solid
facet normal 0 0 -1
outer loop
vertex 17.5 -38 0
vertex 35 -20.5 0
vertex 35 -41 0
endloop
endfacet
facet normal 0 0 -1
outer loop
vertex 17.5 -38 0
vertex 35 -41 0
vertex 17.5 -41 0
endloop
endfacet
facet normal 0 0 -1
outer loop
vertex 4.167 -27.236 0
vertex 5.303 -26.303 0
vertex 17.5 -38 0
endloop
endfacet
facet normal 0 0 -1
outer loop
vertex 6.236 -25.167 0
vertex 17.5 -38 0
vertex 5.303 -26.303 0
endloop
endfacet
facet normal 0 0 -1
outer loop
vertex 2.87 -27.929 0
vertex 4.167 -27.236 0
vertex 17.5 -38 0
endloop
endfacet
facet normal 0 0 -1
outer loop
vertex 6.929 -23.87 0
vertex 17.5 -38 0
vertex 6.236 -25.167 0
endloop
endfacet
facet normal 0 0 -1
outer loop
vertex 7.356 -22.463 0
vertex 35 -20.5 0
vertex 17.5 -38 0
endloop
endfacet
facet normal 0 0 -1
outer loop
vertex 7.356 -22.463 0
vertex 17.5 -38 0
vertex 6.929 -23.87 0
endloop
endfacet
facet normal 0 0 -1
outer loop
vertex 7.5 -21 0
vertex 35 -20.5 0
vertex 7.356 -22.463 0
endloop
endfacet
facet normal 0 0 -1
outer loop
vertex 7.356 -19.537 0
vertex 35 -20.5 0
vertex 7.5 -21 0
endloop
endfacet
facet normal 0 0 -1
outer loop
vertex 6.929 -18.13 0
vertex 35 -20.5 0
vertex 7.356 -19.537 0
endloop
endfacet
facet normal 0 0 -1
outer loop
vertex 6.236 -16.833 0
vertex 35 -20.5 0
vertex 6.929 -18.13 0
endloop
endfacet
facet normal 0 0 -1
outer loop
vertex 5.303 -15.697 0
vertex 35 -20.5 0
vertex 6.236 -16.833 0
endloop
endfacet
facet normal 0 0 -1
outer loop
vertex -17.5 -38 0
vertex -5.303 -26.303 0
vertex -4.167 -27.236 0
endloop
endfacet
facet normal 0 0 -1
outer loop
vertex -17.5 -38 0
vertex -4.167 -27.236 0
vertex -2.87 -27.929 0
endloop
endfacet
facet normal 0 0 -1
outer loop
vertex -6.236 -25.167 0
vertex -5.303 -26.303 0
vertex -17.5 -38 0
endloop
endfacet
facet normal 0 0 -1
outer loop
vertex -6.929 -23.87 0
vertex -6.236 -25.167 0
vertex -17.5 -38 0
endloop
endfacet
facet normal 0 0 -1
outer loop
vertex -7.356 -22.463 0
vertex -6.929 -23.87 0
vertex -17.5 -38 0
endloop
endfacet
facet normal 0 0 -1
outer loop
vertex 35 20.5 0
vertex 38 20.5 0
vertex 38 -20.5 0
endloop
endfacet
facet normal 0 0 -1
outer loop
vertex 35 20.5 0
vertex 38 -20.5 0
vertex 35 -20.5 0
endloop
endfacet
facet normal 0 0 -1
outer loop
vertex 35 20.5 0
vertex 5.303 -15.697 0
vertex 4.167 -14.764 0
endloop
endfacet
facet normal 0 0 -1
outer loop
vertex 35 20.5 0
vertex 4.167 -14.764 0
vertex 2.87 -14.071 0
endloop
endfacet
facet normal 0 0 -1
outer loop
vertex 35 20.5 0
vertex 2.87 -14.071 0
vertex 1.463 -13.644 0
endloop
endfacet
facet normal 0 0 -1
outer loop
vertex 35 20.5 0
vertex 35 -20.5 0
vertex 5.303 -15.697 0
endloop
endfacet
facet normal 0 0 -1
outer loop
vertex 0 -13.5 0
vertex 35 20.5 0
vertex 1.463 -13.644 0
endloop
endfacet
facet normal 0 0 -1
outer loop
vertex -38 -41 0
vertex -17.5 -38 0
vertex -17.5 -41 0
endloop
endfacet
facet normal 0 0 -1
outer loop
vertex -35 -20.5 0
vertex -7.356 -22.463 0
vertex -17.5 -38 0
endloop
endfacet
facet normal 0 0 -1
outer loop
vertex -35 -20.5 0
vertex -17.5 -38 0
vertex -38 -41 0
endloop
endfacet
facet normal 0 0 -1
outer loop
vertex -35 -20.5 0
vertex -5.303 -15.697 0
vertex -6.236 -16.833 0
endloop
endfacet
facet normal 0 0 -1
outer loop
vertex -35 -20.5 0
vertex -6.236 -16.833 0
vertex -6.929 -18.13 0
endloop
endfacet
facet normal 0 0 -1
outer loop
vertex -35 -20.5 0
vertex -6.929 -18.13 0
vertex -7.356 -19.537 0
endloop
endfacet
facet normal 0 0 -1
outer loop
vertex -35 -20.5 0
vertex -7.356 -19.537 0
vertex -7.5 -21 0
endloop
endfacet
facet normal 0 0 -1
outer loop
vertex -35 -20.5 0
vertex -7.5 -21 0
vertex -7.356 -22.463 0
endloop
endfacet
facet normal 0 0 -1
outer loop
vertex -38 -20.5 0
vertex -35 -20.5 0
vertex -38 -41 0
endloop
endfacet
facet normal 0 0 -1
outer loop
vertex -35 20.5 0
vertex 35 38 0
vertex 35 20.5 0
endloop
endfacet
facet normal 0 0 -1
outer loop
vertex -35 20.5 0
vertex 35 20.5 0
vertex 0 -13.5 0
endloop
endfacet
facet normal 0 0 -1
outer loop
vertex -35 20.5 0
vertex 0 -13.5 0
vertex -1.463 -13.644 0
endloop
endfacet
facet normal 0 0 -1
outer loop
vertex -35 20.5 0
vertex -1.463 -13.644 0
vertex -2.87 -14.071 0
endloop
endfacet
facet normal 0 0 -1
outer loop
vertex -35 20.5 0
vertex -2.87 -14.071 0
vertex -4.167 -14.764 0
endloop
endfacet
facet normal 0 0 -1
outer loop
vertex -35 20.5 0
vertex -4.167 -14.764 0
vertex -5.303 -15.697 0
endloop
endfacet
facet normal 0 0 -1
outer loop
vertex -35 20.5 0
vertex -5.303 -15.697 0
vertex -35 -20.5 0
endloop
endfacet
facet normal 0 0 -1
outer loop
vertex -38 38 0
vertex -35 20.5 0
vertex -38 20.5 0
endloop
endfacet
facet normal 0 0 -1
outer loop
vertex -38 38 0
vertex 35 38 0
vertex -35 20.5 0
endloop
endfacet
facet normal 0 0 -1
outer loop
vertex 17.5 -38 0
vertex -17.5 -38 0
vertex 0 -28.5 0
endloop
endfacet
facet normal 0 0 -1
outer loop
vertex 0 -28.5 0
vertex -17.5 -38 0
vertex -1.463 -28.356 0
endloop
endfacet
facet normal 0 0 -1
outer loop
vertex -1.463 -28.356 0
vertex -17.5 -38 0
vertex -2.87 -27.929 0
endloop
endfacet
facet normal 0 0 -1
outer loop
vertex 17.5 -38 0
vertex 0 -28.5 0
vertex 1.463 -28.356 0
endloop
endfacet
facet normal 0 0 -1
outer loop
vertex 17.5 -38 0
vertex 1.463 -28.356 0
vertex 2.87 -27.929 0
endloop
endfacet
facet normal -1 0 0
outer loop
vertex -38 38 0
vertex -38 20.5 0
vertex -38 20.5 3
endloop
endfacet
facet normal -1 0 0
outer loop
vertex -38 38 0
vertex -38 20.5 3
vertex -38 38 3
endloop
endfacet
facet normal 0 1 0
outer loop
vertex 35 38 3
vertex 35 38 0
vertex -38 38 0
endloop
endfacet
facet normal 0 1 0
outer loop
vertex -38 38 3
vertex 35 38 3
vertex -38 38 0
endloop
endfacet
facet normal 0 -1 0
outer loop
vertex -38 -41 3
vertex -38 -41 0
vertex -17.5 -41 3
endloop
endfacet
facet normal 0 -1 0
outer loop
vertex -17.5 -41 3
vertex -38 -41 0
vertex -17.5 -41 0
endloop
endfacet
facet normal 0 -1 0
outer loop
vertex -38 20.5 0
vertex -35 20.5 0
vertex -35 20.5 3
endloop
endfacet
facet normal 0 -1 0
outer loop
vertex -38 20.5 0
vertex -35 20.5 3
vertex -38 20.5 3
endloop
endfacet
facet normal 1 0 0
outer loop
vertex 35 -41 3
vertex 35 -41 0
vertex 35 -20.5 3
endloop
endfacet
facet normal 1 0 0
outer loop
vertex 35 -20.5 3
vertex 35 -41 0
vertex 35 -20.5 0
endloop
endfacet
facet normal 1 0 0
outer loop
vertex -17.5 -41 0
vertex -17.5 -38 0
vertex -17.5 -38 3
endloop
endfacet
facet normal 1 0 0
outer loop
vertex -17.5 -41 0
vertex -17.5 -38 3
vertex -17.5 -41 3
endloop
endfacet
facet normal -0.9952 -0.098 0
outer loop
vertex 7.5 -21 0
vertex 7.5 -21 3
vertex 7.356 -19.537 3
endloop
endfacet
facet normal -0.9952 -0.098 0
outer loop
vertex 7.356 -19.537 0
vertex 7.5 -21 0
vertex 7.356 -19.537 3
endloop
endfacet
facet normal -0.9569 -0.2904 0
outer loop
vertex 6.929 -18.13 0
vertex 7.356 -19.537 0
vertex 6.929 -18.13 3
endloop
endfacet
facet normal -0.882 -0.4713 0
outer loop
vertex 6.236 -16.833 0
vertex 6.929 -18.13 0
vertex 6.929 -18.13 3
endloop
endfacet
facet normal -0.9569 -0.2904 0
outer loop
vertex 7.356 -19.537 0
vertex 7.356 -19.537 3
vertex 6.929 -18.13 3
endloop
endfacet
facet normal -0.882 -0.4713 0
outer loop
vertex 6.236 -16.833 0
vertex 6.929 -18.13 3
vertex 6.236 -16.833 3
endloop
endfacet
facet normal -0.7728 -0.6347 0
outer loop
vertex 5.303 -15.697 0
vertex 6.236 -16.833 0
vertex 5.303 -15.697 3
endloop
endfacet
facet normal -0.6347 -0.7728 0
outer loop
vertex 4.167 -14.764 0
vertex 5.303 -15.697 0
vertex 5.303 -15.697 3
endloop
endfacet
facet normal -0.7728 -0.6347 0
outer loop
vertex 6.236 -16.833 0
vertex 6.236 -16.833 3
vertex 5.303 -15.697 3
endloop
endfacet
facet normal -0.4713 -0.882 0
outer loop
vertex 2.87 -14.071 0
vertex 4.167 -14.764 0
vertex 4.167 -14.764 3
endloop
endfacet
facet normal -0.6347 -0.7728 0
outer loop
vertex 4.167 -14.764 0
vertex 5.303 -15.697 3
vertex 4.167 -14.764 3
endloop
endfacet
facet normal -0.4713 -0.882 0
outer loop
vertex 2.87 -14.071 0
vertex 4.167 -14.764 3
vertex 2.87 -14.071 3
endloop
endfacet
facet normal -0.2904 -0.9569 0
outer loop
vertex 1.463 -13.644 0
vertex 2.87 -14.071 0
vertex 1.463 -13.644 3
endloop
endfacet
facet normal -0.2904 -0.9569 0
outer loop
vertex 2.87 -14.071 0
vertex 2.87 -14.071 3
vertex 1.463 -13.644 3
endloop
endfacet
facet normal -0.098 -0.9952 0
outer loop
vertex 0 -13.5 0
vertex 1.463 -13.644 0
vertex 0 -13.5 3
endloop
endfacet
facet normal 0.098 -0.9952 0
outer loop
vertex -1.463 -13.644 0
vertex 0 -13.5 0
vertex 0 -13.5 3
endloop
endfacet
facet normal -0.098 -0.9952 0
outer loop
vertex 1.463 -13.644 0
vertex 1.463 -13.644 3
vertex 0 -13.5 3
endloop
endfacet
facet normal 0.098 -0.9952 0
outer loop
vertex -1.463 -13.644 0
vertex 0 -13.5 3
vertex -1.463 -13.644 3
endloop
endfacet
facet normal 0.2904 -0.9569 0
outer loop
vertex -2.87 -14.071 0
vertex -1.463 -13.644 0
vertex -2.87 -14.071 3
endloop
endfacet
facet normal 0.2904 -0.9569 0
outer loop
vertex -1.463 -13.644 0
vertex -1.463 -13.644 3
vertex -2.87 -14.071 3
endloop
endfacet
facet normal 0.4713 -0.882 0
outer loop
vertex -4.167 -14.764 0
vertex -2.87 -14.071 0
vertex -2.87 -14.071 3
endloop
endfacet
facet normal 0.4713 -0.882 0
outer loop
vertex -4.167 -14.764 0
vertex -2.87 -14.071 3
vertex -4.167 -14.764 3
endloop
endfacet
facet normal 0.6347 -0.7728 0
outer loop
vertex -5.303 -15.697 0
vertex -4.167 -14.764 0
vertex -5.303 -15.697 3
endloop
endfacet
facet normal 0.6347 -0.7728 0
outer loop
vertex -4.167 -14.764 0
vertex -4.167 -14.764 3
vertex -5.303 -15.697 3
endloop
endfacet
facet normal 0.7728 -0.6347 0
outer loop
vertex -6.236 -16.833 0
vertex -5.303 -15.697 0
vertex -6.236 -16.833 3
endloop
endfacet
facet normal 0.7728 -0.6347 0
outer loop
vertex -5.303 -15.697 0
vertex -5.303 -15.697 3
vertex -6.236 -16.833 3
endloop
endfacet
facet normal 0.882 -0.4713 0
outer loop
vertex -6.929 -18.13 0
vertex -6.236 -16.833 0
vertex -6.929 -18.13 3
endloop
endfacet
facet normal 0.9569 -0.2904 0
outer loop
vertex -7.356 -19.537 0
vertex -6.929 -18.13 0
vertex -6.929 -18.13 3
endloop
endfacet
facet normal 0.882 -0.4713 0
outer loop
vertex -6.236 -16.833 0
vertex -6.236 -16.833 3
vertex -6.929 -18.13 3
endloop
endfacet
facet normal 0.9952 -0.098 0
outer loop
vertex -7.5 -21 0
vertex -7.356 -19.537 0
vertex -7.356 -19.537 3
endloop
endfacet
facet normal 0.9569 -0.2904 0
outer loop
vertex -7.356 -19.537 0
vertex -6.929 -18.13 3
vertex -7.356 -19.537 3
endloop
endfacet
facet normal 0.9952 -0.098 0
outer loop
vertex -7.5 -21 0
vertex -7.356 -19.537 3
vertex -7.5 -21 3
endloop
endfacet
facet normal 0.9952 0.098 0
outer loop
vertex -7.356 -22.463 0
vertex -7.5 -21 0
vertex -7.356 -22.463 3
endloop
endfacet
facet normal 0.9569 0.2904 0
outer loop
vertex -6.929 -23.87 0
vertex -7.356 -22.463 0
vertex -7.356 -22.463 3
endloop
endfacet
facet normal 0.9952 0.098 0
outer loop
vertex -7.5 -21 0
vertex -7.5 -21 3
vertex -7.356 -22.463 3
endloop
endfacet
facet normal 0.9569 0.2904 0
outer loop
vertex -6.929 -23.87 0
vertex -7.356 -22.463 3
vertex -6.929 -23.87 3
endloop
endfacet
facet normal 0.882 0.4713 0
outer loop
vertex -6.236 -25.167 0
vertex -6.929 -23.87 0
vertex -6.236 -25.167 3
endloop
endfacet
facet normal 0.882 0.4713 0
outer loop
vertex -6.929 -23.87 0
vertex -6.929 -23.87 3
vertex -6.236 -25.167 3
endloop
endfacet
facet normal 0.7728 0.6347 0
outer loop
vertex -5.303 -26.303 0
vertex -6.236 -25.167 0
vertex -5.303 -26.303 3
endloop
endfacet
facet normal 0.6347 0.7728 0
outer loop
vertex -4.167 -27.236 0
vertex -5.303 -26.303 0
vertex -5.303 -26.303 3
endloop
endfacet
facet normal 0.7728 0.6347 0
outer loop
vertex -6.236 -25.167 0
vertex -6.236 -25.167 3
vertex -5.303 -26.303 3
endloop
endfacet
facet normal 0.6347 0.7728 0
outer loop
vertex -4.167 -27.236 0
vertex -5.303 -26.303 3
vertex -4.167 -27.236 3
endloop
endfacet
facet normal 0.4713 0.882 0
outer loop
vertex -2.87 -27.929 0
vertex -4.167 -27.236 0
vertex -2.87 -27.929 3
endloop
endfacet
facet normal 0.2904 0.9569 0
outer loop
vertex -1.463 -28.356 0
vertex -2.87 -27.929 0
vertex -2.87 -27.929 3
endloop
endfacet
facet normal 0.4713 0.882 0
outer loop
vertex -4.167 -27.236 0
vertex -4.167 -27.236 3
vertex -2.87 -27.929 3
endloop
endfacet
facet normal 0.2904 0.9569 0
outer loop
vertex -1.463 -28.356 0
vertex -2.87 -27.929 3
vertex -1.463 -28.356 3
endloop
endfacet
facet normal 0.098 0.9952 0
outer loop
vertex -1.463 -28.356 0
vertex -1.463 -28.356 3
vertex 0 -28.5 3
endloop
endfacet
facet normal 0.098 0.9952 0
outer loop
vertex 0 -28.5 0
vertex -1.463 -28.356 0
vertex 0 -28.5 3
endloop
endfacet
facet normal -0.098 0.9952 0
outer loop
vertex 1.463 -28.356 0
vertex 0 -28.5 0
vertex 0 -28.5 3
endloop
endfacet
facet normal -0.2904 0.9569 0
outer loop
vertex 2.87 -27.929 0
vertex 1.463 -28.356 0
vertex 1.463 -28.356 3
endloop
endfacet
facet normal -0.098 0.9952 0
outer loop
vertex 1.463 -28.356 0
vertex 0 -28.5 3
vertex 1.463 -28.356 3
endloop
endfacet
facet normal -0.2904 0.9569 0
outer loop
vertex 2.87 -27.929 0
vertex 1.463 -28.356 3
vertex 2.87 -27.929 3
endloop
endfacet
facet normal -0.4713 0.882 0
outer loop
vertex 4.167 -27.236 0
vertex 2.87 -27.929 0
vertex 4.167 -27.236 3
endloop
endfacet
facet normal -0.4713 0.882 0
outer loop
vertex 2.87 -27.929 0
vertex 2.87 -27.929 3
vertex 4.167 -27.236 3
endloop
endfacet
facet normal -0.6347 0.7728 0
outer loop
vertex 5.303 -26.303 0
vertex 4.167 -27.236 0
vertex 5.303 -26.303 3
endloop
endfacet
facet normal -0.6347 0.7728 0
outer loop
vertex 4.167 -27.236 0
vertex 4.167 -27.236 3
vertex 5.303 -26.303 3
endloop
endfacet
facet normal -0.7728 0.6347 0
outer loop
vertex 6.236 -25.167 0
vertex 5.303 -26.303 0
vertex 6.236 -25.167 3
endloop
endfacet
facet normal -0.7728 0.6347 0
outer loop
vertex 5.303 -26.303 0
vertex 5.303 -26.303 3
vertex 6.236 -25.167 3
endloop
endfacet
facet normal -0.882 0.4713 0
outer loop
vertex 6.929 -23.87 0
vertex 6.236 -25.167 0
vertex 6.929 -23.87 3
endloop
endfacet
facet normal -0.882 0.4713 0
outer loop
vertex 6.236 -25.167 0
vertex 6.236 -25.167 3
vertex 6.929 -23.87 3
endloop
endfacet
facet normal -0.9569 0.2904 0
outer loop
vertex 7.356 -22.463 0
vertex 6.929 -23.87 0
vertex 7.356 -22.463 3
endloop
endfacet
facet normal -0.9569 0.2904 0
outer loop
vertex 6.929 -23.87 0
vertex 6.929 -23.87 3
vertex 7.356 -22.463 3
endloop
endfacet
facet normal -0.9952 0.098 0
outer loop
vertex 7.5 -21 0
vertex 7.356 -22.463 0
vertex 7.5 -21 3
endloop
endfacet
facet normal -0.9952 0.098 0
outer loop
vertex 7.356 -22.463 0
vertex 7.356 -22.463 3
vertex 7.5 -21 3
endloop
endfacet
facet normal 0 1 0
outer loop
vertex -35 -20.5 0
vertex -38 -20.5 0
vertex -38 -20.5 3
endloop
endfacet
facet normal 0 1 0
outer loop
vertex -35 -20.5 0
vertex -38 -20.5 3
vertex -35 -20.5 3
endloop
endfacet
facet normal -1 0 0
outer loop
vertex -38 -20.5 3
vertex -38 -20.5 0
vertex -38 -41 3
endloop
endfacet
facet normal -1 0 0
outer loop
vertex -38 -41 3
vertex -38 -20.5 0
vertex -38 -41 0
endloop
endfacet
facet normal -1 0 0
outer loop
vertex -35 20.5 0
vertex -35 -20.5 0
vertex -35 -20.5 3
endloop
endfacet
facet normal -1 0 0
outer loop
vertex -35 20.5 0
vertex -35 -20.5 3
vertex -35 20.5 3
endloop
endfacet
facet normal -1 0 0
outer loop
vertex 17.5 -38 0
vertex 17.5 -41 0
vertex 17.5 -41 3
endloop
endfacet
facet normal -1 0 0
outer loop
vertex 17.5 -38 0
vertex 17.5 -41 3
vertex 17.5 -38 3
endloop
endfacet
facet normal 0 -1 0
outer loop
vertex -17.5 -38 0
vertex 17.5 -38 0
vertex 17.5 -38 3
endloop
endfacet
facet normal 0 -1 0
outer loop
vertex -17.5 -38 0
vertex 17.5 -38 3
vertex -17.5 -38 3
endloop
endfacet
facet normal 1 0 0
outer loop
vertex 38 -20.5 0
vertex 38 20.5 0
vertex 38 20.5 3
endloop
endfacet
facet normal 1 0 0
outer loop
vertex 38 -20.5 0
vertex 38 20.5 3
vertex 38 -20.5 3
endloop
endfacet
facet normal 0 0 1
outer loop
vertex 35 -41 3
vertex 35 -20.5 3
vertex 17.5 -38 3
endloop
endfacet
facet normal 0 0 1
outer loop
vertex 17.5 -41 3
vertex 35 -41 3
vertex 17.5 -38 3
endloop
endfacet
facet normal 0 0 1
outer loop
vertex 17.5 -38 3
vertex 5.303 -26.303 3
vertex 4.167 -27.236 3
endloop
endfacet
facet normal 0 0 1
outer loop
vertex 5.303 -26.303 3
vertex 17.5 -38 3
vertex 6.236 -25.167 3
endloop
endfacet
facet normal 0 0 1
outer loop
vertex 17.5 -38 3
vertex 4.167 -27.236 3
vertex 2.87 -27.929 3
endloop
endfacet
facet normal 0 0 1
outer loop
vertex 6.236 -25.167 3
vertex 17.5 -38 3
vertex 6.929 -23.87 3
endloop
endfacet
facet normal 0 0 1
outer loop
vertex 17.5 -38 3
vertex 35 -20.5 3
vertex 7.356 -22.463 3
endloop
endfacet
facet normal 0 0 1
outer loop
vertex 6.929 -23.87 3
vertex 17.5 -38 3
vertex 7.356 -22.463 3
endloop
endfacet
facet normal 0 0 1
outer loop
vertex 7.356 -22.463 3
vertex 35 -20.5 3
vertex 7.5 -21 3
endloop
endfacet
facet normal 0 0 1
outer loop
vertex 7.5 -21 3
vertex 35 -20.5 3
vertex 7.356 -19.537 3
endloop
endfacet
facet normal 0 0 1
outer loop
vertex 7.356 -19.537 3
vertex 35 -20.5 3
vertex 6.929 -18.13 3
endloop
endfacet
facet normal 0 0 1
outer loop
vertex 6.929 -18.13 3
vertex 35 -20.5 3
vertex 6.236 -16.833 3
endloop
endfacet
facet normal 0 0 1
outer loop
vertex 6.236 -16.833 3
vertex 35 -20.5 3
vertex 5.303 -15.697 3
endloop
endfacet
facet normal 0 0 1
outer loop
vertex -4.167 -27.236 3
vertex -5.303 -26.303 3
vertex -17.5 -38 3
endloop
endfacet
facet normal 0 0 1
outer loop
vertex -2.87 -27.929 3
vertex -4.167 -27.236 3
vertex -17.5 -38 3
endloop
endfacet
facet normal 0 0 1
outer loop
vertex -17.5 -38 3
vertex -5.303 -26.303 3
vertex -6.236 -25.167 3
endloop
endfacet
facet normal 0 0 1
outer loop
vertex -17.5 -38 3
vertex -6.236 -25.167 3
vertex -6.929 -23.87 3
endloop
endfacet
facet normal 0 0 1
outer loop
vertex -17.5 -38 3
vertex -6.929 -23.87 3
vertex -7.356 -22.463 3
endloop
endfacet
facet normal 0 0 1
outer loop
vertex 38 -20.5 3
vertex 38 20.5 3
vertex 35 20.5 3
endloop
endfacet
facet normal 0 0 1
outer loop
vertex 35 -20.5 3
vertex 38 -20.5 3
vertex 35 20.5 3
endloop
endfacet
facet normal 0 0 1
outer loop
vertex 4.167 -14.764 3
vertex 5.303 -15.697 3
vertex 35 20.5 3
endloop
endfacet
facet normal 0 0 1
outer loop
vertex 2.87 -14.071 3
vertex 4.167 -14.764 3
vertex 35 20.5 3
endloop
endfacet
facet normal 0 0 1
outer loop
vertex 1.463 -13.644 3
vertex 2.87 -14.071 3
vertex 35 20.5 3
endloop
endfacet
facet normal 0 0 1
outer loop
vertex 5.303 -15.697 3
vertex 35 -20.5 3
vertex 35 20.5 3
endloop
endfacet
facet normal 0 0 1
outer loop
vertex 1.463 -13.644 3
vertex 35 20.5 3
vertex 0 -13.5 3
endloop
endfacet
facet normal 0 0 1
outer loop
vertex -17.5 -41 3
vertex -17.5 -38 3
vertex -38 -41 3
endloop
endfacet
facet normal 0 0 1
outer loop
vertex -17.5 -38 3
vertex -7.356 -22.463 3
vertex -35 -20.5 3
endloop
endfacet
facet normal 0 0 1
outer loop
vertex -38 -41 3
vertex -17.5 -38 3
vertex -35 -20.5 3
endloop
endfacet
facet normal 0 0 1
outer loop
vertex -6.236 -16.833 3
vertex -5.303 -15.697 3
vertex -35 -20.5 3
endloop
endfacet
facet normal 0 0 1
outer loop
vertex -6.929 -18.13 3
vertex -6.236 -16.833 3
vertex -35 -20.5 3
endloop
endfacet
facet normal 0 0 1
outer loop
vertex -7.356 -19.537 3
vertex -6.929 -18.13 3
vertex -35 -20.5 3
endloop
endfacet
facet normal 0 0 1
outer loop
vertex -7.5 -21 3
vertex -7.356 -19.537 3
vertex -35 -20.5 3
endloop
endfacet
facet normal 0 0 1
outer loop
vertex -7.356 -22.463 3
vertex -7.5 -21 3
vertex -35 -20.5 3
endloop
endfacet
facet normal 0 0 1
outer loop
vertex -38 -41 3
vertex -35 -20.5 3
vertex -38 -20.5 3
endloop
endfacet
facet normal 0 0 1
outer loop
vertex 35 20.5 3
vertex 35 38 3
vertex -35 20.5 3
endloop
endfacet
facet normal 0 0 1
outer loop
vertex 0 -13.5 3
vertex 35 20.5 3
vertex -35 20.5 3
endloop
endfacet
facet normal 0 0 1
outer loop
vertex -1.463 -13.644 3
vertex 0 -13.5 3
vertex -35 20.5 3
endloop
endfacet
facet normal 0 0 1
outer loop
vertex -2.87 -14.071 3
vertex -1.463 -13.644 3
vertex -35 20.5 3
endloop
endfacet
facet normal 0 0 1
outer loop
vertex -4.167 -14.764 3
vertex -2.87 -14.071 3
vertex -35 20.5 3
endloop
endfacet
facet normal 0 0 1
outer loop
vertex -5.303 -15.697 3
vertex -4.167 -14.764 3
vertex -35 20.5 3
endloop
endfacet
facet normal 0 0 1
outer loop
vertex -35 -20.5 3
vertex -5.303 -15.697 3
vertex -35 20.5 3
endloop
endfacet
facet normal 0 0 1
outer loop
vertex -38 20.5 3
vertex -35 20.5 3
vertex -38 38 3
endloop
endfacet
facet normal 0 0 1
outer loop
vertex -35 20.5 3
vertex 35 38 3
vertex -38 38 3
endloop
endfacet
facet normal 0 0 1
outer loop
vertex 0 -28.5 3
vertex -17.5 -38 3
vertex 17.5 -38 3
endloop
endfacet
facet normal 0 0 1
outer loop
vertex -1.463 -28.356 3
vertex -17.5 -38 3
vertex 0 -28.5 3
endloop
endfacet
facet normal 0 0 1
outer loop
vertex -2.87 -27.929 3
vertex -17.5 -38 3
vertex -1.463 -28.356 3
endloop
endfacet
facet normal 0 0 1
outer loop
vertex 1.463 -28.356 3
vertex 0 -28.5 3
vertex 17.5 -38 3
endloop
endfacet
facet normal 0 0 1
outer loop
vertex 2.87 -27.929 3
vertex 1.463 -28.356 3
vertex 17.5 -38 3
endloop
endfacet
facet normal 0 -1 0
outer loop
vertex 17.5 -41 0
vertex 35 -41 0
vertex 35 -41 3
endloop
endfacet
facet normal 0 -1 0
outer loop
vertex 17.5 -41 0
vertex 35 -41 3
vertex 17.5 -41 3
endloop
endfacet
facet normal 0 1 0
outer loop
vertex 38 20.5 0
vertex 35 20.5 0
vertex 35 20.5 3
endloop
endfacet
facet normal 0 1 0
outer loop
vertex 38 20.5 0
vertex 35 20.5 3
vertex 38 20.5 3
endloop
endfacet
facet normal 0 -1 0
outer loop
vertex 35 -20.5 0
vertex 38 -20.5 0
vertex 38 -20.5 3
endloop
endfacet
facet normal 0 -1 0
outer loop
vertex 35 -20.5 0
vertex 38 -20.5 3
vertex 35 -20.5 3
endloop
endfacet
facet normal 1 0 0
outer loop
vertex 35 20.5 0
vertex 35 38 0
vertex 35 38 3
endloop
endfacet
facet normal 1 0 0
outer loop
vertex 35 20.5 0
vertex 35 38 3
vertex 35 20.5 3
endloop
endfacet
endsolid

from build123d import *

# Parameters (mm, degrees)
BOSS_EXTRUDE1_DEPTH = 3
SKETCH2_R           = 7.5
CUT_EXTRUDE1_DEPTH  = 3


with BuildPart() as part:
    # Sketch1 → Boss-Extrude1 (new body)
    with BuildSketch(Plane.XY):
        Polygon((-35, 38), (-17.5, 38), (17.5, 38), (35, 38), (35, 20.5), (38, 20.5), (38, -20.5), (35, -20.5), (35, -38), (35, -41), (17.5, -41), (17.5, -38), (-17.5, -38), (-17.5, -41), (-35, -41), (-38, -41), (-38, -38), (-38, -20.5), (-35, -20.5), (-35, 20.5), (-38, 20.5), (-38, 38), align=None)
    extrude(amount=BOSS_EXTRUDE1_DEPTH)

    # Sketch2 → Cut-Extrude1 (cut)
    with BuildSketch(Plane.XY.offset(3)):
        with Locations((0, -21)):
            Circle(SKETCH2_R)
    extrude(amount=-CUT_EXTRUDE1_DEPTH, mode=Mode.SUBTRACT)


solid = part.part
